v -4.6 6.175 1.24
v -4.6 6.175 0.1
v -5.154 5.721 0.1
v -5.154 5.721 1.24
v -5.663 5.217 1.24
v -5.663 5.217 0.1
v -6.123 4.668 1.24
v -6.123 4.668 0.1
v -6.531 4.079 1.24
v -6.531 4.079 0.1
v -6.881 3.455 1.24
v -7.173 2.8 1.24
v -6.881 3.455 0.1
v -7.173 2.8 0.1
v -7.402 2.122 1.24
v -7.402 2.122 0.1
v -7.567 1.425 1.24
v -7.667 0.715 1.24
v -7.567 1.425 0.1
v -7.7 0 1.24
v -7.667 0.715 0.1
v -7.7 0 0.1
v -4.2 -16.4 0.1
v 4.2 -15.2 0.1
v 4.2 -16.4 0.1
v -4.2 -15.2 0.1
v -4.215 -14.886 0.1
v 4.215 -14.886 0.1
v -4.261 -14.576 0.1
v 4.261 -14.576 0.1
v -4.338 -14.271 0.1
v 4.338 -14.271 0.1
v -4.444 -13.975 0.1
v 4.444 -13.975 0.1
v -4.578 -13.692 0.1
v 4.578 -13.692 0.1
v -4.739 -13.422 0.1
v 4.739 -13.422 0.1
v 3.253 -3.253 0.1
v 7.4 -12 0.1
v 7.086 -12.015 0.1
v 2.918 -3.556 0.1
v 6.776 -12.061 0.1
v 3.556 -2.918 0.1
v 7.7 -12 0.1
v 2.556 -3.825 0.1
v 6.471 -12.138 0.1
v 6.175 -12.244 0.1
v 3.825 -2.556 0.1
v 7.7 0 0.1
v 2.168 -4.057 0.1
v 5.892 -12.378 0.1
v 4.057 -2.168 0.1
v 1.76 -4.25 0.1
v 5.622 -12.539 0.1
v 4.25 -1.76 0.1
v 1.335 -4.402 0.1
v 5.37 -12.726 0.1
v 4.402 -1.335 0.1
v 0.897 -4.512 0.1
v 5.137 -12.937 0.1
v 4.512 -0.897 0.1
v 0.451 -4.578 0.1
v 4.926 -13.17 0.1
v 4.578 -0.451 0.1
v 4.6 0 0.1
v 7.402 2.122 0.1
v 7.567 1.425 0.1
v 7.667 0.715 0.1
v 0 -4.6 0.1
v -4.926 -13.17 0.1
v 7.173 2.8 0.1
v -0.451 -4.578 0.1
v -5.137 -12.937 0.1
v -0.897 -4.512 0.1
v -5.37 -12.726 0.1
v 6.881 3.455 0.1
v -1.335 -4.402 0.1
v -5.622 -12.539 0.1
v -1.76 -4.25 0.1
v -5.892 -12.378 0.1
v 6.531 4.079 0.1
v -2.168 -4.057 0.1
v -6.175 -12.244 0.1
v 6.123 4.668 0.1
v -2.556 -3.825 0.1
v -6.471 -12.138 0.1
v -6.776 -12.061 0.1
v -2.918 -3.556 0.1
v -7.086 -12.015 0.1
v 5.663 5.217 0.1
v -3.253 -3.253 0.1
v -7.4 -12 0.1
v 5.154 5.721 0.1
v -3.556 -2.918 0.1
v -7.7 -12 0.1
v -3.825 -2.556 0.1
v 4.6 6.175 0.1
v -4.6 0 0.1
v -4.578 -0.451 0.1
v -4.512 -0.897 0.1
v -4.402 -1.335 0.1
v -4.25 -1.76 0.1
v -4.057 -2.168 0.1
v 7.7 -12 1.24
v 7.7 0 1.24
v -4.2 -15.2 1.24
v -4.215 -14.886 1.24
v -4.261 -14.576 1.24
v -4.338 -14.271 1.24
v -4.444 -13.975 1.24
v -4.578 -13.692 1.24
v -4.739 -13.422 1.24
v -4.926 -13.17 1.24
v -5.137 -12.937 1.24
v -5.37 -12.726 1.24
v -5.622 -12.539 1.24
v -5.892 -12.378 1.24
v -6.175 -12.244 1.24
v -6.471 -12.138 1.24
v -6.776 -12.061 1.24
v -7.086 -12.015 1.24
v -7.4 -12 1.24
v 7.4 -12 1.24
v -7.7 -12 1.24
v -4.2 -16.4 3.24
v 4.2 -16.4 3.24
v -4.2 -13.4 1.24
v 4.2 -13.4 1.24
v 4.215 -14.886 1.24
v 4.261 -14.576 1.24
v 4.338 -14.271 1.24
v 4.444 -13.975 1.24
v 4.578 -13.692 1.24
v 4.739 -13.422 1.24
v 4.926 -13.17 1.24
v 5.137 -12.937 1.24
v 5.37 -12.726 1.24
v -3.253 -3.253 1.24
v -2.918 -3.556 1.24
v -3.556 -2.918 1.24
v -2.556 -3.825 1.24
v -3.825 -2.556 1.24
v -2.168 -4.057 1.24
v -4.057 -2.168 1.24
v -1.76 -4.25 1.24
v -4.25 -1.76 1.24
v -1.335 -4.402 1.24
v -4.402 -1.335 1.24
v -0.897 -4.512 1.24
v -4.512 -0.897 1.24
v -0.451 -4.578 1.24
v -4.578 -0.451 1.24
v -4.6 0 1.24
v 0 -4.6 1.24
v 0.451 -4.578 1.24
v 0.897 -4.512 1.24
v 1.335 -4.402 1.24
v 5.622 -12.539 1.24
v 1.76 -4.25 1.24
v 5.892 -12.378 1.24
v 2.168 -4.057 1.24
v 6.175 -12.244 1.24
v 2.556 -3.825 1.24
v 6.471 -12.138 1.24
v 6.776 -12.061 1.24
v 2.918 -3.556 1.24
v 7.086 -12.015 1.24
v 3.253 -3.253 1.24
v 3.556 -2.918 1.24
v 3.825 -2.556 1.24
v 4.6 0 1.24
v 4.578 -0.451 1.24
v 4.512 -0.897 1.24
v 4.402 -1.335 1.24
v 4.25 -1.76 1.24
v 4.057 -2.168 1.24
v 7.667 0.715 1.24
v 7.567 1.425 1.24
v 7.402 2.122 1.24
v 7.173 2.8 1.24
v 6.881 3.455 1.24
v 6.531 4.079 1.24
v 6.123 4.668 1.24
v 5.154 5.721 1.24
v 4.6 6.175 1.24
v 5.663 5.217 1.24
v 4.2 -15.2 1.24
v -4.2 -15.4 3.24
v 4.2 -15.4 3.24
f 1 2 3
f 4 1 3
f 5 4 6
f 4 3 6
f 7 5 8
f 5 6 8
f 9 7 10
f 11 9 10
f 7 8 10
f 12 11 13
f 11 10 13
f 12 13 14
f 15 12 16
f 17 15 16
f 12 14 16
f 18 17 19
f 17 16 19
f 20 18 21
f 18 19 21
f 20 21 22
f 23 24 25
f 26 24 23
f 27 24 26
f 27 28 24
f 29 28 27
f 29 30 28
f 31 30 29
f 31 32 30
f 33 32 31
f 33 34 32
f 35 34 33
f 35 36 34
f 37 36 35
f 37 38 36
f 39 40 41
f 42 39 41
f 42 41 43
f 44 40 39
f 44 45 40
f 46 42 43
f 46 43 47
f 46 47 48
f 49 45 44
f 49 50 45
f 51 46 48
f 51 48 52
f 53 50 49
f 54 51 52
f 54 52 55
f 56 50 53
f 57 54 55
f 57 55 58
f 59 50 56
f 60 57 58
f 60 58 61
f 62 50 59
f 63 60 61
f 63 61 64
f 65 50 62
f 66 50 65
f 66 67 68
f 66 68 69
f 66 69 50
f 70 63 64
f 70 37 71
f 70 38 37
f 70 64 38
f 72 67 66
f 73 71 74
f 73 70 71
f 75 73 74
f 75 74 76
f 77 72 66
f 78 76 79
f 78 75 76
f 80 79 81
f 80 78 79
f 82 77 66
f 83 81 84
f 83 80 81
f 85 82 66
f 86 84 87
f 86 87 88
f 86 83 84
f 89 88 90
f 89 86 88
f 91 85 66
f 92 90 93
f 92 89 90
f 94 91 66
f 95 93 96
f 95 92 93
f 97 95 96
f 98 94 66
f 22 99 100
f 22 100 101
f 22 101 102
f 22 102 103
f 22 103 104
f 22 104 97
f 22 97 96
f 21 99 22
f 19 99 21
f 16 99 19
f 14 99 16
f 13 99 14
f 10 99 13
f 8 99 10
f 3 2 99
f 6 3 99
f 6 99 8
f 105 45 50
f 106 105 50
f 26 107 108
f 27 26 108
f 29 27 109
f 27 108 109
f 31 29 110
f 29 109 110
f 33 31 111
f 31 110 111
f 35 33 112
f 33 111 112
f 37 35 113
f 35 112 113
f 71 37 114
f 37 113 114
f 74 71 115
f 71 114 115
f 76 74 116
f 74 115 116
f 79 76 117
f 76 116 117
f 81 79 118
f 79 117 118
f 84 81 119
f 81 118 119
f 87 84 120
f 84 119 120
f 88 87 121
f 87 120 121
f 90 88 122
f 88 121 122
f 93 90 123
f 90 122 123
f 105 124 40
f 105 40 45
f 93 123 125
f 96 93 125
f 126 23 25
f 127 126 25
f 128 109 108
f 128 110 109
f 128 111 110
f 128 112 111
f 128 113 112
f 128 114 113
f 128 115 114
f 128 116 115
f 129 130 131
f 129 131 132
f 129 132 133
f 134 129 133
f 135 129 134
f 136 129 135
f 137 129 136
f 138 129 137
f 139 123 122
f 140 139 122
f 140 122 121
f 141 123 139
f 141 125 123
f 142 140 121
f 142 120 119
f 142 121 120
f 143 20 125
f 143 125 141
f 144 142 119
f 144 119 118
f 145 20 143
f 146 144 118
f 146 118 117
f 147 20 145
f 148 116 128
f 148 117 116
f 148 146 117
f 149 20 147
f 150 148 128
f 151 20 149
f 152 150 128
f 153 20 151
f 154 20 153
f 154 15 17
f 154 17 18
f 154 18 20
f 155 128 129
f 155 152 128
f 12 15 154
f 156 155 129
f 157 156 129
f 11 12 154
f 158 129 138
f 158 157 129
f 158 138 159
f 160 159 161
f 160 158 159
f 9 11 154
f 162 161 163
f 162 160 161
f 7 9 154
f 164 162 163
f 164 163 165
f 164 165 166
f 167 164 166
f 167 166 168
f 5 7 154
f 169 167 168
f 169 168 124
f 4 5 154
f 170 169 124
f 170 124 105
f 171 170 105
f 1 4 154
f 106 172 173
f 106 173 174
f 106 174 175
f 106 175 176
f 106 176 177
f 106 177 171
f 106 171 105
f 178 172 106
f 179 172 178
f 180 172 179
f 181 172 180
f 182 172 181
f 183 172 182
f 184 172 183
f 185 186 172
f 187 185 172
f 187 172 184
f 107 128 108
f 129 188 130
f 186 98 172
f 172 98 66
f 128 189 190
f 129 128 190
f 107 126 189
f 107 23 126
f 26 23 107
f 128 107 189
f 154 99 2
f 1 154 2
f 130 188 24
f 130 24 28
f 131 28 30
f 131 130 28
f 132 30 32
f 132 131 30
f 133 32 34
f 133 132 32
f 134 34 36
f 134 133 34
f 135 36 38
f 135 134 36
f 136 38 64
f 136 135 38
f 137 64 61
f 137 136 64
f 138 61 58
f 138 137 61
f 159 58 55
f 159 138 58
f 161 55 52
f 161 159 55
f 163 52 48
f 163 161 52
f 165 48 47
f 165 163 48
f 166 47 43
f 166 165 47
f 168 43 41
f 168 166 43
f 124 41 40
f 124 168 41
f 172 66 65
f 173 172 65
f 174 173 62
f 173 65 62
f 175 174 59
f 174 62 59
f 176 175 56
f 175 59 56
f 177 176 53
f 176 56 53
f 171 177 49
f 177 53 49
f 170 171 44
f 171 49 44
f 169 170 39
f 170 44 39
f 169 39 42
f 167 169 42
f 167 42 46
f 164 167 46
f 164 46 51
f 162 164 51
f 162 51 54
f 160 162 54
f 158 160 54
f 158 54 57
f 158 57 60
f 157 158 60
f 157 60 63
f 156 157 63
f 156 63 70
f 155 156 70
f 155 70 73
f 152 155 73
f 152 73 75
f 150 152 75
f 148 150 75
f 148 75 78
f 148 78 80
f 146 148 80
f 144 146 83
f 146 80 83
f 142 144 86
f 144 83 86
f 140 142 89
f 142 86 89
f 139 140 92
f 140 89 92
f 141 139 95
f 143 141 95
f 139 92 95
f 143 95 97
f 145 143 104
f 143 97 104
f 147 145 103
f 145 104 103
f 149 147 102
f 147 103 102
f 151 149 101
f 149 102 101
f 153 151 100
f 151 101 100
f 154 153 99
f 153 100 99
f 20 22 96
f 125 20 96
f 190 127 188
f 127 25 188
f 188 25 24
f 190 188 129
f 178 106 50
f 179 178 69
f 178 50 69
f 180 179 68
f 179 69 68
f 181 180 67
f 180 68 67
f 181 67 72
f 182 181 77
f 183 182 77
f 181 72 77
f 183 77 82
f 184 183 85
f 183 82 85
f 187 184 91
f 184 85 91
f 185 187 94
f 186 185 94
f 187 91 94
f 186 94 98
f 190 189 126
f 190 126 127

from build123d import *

# Parameters (mm, degrees)
EXTRUDE_1_DEPTH     = 1.24
CUT_EXTRUDE_1_DEPTH = 1.24
SKETCH_4_W          = 8.4
SKETCH_4_H          = 3
EXTRUDE_2_DEPTH     = 2.2
CHAMFER_1_SIZE      = 1.2
CHAMFER_1_SIZE_2    = 2.4
SKETCH_5_W          = 8.4
SKETCH_5_H          = 4.2
CUT_EXTRUDE_2_DEPTH = 23.25946091
SKETCH_6_W          = 8.4
SKETCH_6_H          = 3
EXTRUDE_3_DEPTH     = 2
CHAMFER_2_SIZE      = 2
CUT_EXTRUDE_3_DEPTH = 0.1


# Some blends are built 0.0001 mm under size
with BuildPart() as part:
    # Эскиз1 → Бобышка-Вытянуть1 (new body)
    with BuildSketch(Plane.XY):
        with BuildLine():
            Line((-4.6, 0), (-4.6, 6.174949393))
            ThreePointArc((-4.6, 6.174949393), (-6.88149693, 3.454706934), (-7.7, 0))
            Line((-7.7, 0), (-7.7, -20.6))
            Line((-7.7, -20.6), (7.7, -20.6))
            Line((7.7, -20.6), (7.7, 0))
            ThreePointArc((7.7, 0), (6.88149693, 3.454706934), (4.6, 6.174949393))
            Line((4.6, 6.174949393), (4.6, 0))
            ThreePointArc((4.6, 0), (0, -4.6), (-4.6, 0))
        make_face()
    extrude(amount=EXTRUDE_1_DEPTH)

    # Эскиз3 → Вырез-Вытянуть1 (cut)
    with BuildSketch(Plane.XY.offset(1.24)):
        with BuildLine():
            Line((-7.7, -20.6), (-4.2, -20.6))
            Line((-4.2, -20.6), (-4.2, -15.2))
            ThreePointArc((-4.2, -15.2), (-5.1372583, -12.9372583), (-7.4, -12))
            Line((-7.4, -12), (-7.7, -12))
            Line((-7.7, -12), (-7.7, -20.6))
        make_face()
        with BuildLine():
            Line((4.2, -20.6), (4.2, -15.2))
            ThreePointArc((4.2, -15.2), (5.1372583, -12.9372583), (7.4, -12))
            Line((7.4, -12), (7.7, -12))
            Line((7.7, -12), (7.7, -20.6))
            Line((7.7, -20.6), (4.2, -20.6))
        make_face()
    extrude(amount=-CUT_EXTRUDE_1_DEPTH, mode=Mode.SUBTRACT)

    # Эскиз4 → Бобышка-Вытянуть2 (add)
    with BuildSketch(Plane.XY.offset(1.24)):
        with Locations((0, -19.1)):
            Rectangle(SKETCH_4_W, SKETCH_4_H)
    extrude(amount=EXTRUDE_2_DEPTH)

    # Фаска1
    # the kernel refuses this chamfer: 2.4, 1.2 mm, written as the material it adds along each edge
    with BuildSketch(Plane(origin=(4.2, -17.6, 1.24), x_dir=(0, 0.9976223042390325, -0.06891834360170876), z_dir=(-1, 0, 0))) as chamfer_1_piece_1_section:
        Polygon((CHAMFER_1_SIZE * 0.997622304239, -CHAMFER_1_SIZE * 0.0689183436017), (-CHAMFER_1_SIZE_2 * 0.0689183436017, -CHAMFER_1_SIZE_2 * 0.997622304239), (0, 0), align=None)
    chamfer_1_piece_1 = extrude(amount=8.4, mode=Mode.PRIVATE)
    chamfer_1_piece_1 = split(chamfer_1_piece_1, bisect_by=Plane(origin=(0, -17.211387721, 3.44), z_dir=(0, 0, -1)), keep=Keep.TOP, mode=Mode.PRIVATE)
    add(chamfer_1_piece_1)

    # Эскиз5 → Вырез-Вытянуть2 (cut, through all)
    with BuildSketch(Plane.XY.offset(3.44)):
        with Locations((0, -18.5)):
            Rectangle(SKETCH_5_W, SKETCH_5_H)
    extrude(amount=-CUT_EXTRUDE_2_DEPTH, mode=Mode.SUBTRACT)

    # Эскиз6 → Бобышка-Вытянуть3 (add)
    with BuildSketch(Plane.XY.offset(1.24)):
        with Locations((0, -14.9)):
            Rectangle(SKETCH_6_W, SKETCH_6_H)
    extrude(amount=EXTRUDE_3_DEPTH)

    # Фаска2
    chamfer_2_edges = [part.edges().sort_by_distance(p)[0] for p in [
        (0, -13.4, 3.24),
    ]]
    chamfer(chamfer_2_edges, length=CHAMFER_2_SIZE - 0.0001)  # a hair under: the kernel refuses the full size

    # Эскиз7 → Вырез-Вытянуть3 (cut)
    with BuildSketch(Plane(origin=(0, 0, 0), x_dir=(-1, 0, 0), z_dir=(0, 0, -1))):
        with BuildLine():
            Line((-4.2, -15.2), (-4.2, -16.4))
            Line((-4.2, -16.4), (4.2, -16.4))
            Line((4.2, -16.4), (4.2, -15.2))
            ThreePointArc((4.2, -15.2), (5.1372583, -12.9372583), (7.4, -12))
            Line((7.4, -12), (7.7, -12))
            Line((7.7, -12), (7.7, 0))
            ThreePointArc((7.7, 0), (6.88149693, 3.454706934), (4.6, 6.174949393))
            Line((4.6, 6.174949393), (4.6, 0))
            ThreePointArc((4.6, 0), (0, -4.6), (-4.6, 0))
            Line((-4.6, 0), (-4.6, 6.174949393))
            ThreePointArc((-4.6, 6.174949393), (-6.88149693, 3.454706934), (-7.7, 0))
            Line((-7.7, 0), (-7.7, -12))
            Line((-7.7, -12), (-7.4, -12))
            ThreePointArc((-7.4, -12), (-5.1372583, -12.9372583), (-4.2, -15.2))
        make_face()
    extrude(amount=-CUT_EXTRUDE_3_DEPTH, mode=Mode.SUBTRACT)


solid = part.part
